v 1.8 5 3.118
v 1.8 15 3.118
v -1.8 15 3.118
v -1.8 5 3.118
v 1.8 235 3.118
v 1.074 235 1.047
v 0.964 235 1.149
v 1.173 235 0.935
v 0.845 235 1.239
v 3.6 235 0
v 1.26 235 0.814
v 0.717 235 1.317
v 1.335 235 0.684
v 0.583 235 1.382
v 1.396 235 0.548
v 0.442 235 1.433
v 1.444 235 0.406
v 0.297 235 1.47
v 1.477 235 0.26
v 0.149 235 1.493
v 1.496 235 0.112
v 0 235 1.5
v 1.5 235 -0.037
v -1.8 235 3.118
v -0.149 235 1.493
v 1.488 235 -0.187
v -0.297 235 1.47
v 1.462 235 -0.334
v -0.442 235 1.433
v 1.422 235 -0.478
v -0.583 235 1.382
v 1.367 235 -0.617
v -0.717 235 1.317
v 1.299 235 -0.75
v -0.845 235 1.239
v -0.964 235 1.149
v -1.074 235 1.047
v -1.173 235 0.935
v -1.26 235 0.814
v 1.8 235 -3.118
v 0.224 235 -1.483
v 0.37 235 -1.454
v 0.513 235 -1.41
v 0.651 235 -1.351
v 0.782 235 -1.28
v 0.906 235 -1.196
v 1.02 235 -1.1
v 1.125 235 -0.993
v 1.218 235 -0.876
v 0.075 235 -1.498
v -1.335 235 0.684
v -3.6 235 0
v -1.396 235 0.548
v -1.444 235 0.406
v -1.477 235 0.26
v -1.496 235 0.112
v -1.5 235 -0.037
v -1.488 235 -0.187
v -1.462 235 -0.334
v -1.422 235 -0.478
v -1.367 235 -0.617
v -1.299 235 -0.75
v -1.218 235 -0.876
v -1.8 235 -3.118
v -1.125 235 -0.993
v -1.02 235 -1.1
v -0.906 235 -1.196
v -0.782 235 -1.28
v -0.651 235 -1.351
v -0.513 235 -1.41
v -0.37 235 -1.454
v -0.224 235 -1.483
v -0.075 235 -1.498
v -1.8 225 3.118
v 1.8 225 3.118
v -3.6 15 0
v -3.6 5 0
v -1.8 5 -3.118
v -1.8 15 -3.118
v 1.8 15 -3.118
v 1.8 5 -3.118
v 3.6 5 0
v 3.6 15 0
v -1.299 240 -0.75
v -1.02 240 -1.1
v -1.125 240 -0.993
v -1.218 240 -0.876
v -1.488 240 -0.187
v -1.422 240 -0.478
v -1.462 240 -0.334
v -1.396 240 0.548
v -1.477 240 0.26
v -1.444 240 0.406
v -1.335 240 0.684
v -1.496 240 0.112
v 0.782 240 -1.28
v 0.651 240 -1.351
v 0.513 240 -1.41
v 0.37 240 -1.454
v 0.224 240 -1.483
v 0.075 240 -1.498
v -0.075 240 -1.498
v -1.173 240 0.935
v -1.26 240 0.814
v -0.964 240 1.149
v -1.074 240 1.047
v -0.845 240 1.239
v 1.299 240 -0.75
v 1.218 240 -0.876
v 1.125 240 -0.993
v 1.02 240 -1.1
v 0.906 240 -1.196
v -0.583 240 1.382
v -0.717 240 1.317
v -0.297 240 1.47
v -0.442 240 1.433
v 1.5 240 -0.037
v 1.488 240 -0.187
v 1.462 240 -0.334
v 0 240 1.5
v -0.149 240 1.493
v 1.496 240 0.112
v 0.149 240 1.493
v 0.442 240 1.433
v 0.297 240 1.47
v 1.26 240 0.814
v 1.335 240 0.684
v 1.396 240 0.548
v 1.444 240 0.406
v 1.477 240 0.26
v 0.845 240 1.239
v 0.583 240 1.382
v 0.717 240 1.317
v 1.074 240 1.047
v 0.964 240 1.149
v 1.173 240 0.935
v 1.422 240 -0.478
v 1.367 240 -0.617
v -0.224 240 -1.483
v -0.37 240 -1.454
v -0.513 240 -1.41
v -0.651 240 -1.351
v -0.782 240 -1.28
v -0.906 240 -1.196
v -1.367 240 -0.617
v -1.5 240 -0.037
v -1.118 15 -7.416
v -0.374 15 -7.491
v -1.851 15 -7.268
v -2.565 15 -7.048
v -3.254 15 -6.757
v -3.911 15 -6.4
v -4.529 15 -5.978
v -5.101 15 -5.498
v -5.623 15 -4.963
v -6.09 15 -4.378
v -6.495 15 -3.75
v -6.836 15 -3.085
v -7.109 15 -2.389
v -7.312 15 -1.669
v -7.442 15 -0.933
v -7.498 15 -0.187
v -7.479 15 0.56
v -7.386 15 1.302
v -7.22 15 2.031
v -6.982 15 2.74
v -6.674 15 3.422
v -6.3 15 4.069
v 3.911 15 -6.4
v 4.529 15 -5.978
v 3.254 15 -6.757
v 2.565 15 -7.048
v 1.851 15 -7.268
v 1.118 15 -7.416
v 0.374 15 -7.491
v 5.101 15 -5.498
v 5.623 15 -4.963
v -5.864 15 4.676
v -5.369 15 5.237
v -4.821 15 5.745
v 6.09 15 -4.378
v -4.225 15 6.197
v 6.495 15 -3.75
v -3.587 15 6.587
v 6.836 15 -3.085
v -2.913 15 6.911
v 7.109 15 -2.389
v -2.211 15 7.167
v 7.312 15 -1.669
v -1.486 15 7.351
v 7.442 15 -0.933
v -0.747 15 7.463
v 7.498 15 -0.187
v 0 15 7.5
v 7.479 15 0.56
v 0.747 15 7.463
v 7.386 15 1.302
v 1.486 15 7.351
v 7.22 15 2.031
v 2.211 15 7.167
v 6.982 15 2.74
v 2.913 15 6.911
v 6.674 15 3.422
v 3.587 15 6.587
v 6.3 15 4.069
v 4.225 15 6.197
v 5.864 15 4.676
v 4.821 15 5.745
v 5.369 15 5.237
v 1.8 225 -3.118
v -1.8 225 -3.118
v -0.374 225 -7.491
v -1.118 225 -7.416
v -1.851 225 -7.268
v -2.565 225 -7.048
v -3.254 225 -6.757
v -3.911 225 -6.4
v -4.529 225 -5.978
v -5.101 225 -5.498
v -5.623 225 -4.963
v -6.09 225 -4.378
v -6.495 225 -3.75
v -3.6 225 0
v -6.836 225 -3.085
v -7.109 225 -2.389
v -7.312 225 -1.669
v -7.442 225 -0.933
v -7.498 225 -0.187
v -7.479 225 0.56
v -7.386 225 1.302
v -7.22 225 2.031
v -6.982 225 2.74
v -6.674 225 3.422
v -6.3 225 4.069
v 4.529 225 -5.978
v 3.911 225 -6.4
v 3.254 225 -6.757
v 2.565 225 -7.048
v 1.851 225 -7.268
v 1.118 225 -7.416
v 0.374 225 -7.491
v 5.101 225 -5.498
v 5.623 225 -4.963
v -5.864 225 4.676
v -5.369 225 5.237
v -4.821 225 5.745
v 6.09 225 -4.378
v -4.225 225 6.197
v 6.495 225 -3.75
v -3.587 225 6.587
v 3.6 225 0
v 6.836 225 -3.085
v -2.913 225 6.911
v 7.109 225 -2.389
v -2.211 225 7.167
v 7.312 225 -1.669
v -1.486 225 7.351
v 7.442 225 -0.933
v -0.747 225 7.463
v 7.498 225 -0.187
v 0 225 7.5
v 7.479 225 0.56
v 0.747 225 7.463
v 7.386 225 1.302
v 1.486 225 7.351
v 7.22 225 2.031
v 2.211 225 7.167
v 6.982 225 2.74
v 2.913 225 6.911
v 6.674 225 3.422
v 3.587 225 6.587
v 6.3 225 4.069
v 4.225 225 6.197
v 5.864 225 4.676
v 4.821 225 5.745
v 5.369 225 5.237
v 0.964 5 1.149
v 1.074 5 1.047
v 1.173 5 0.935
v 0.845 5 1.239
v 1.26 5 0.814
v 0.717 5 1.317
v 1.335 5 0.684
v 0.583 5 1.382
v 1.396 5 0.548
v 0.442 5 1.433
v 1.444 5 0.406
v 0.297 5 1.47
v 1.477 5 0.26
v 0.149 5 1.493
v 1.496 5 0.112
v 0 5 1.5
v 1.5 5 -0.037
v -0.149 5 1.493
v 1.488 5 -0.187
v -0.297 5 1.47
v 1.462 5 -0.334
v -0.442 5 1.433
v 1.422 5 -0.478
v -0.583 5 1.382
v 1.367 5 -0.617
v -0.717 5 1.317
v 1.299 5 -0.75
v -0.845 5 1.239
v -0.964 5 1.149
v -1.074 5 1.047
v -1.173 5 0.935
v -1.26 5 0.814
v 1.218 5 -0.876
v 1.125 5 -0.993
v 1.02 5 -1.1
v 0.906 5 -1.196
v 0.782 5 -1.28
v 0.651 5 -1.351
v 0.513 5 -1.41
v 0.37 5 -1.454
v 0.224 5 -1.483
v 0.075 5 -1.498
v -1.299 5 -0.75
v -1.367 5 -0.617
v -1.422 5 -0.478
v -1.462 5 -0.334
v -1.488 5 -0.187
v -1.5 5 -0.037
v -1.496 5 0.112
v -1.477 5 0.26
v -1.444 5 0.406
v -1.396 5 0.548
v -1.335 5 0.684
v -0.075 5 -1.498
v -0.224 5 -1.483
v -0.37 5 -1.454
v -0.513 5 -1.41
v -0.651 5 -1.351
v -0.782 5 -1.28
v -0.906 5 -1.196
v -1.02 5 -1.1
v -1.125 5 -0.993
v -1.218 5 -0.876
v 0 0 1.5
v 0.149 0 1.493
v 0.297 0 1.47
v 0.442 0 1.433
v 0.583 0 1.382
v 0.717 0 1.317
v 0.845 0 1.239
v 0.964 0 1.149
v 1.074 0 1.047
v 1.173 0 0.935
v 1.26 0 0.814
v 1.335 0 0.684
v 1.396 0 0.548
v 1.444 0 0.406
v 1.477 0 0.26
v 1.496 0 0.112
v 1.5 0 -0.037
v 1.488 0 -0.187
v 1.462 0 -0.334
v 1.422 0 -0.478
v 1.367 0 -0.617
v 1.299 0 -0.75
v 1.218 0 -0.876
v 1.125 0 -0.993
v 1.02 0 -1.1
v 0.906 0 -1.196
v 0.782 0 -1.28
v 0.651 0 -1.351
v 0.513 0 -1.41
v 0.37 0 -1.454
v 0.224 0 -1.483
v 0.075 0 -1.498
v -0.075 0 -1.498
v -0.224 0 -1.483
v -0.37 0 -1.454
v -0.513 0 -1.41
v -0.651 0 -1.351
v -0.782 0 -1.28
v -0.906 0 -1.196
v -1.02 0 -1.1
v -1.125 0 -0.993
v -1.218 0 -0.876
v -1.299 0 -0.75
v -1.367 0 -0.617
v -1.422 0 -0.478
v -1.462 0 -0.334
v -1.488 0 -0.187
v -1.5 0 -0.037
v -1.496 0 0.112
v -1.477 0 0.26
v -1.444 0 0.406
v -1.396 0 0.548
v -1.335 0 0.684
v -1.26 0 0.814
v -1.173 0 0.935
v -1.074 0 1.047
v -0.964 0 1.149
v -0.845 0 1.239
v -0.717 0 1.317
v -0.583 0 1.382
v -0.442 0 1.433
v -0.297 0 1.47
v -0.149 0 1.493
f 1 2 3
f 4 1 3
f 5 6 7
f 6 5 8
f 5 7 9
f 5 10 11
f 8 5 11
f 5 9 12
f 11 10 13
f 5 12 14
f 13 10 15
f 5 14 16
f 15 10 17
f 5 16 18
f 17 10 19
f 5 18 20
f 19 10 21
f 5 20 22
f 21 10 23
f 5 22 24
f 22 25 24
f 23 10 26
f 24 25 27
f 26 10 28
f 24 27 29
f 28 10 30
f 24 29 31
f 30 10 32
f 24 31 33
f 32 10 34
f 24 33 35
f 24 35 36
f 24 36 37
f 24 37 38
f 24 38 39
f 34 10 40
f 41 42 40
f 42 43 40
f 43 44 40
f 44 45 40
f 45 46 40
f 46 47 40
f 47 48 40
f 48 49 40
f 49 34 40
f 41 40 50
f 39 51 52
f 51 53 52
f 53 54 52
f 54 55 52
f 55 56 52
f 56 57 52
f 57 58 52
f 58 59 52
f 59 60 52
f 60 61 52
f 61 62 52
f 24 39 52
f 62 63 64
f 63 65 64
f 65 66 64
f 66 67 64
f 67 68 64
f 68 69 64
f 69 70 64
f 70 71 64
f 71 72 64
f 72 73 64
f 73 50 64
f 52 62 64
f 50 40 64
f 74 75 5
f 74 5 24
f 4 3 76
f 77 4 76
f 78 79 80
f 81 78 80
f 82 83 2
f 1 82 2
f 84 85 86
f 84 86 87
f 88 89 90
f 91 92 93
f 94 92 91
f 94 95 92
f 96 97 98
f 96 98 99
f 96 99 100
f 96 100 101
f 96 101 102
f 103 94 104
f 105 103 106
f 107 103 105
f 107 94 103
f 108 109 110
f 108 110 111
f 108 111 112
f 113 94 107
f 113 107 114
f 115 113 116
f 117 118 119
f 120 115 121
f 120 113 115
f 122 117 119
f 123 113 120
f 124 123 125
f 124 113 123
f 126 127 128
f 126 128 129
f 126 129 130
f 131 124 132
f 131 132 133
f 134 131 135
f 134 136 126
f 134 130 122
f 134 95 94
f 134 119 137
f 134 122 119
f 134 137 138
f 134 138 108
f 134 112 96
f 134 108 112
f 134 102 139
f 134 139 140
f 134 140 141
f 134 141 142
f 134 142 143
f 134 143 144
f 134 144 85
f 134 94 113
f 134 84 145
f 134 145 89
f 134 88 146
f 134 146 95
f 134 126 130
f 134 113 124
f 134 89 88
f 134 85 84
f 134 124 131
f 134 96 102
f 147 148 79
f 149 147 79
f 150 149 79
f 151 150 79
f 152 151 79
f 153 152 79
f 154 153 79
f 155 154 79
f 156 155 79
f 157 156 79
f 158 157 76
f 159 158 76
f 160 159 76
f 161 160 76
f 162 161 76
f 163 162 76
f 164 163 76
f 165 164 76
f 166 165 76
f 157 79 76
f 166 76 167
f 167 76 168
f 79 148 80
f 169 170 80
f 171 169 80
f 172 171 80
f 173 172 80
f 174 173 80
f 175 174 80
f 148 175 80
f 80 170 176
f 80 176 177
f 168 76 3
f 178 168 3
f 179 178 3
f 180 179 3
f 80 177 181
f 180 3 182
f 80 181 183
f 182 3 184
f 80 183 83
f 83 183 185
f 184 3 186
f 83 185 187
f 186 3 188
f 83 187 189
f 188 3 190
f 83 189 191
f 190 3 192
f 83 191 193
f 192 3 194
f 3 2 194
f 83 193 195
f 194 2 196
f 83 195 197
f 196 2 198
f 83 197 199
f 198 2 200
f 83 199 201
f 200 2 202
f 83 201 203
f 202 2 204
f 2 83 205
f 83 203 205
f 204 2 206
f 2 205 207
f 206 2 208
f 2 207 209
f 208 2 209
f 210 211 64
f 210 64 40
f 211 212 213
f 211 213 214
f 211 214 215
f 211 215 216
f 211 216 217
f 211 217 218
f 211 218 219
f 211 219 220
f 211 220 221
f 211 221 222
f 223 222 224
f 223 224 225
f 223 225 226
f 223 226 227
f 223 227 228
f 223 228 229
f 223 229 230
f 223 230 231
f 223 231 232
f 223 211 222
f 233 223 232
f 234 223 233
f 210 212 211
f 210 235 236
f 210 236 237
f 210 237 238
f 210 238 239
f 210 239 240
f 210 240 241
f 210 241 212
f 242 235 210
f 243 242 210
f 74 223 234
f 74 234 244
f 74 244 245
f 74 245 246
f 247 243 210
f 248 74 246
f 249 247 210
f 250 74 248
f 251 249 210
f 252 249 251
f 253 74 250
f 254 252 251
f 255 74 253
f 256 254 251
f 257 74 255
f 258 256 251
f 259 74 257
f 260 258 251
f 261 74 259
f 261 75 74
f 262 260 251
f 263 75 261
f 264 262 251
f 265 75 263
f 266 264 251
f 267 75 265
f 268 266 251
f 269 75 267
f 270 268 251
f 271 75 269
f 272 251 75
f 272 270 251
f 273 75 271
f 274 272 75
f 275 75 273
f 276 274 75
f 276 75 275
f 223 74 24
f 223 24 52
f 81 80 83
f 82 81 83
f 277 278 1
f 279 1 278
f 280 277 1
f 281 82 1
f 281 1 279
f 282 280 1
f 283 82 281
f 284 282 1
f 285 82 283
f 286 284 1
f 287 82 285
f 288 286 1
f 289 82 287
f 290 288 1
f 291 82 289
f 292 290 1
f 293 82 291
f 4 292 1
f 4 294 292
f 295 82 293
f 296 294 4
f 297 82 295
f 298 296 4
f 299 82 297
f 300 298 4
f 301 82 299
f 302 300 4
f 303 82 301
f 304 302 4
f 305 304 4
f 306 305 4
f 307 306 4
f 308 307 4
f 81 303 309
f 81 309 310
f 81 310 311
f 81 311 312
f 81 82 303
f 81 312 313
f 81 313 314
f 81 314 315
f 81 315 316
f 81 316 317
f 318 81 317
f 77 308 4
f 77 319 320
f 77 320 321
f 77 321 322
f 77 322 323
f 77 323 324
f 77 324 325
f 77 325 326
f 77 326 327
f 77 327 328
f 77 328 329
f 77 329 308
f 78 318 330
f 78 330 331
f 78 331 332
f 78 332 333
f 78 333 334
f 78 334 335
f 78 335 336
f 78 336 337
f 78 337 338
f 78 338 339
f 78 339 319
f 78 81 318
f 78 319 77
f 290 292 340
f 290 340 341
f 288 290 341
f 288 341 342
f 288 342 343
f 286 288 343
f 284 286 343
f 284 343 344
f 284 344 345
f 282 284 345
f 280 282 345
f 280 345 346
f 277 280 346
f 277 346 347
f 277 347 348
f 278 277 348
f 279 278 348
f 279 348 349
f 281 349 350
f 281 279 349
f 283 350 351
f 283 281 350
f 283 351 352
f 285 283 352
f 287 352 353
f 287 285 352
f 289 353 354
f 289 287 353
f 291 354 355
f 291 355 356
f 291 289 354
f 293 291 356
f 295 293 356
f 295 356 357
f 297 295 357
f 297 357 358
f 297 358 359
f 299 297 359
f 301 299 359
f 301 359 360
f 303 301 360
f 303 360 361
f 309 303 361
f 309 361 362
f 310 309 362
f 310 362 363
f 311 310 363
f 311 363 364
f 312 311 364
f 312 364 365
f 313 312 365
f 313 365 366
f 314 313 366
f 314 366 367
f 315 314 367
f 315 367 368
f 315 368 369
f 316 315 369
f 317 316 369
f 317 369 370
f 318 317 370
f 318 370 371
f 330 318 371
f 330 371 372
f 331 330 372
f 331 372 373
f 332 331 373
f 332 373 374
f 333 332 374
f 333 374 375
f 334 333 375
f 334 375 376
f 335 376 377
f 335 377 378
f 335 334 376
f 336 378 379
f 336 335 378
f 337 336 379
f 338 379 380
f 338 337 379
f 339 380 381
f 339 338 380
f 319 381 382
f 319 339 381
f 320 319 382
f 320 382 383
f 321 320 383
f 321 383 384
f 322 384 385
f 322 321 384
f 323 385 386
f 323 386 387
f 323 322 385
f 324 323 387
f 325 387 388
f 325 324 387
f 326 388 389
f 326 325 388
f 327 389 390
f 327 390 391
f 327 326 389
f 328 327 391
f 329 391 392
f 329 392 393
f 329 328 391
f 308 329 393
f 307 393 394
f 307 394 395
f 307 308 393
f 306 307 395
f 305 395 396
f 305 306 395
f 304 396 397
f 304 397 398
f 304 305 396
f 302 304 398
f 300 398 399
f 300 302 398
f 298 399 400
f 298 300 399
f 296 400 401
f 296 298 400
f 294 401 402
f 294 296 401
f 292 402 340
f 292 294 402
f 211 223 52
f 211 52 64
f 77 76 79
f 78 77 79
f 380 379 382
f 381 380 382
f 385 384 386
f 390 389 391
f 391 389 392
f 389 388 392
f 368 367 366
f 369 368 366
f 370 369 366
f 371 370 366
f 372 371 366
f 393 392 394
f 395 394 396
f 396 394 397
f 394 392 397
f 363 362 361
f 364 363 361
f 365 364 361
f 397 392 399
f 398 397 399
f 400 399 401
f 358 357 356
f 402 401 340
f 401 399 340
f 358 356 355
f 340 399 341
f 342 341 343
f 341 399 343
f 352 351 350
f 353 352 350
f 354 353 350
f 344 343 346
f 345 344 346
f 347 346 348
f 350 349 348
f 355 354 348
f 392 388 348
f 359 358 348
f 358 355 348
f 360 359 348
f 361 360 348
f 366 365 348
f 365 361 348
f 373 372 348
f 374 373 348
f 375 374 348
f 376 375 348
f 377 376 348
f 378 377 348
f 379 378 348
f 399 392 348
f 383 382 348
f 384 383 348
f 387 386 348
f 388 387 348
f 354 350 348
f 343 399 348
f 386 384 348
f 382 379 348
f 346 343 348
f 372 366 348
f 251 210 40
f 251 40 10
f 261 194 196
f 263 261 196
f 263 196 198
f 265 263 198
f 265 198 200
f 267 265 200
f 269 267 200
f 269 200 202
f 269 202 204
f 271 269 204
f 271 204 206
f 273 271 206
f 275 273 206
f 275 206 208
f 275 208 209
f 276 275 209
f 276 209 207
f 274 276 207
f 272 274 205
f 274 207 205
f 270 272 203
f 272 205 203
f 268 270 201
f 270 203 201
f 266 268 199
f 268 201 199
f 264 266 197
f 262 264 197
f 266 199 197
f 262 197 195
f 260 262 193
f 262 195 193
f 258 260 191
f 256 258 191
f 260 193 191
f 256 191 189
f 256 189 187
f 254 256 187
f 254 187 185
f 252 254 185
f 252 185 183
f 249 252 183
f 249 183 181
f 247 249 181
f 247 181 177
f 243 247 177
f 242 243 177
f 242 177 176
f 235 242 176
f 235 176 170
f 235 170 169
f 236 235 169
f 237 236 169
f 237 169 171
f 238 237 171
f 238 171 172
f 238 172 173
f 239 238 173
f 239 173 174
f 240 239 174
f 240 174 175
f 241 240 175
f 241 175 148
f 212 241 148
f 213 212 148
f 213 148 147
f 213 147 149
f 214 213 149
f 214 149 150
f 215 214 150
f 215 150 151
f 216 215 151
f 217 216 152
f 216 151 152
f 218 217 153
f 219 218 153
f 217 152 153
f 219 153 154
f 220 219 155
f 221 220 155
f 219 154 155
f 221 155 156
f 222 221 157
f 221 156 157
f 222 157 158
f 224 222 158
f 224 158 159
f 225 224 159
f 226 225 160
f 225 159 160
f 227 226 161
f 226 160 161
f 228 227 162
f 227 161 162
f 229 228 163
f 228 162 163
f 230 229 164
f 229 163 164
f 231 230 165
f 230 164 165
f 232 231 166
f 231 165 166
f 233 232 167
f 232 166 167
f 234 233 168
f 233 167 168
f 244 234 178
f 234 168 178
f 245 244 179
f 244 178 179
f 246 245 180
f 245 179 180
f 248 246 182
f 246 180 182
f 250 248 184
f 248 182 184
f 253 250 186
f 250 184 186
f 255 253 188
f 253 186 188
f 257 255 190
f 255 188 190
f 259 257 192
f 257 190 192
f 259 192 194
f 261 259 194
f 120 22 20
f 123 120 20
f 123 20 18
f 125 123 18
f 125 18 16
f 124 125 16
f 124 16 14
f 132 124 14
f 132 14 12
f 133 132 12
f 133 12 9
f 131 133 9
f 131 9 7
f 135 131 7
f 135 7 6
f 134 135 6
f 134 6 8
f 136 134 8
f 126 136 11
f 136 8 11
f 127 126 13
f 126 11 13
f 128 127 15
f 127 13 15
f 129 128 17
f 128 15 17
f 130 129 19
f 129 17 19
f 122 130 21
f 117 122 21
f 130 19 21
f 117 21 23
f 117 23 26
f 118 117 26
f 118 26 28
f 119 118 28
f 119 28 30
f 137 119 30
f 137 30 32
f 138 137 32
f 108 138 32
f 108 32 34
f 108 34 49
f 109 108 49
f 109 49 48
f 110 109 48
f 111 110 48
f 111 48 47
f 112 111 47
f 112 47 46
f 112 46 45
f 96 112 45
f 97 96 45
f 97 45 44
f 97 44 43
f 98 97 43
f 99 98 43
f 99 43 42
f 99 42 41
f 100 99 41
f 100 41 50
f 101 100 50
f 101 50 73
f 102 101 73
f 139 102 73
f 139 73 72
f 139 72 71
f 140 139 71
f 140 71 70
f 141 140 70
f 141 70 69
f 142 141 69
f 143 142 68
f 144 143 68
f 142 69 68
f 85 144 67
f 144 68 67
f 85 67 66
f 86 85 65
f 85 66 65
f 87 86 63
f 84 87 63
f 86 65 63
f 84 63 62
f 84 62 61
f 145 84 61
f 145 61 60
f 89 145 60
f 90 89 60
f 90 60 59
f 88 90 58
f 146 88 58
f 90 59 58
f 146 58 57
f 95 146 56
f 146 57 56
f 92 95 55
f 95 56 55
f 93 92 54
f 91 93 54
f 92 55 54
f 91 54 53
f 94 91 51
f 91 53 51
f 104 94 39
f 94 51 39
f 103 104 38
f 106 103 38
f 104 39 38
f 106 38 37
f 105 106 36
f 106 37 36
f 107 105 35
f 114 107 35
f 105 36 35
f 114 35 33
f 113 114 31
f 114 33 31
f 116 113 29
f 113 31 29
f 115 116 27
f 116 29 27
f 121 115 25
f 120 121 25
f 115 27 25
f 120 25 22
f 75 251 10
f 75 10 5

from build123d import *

# Parameters (mm, degrees)
SKETCH2_R           = 7.5
BOSS_EXTRUDE1_DEPTH = 240
CUT_EXTRUDE1_START  = -15
SKETCH3_R           = 7.5
SKETCH3_R_2         = 1.5
CUT_EXTRUDE1_DEPTH  = 15
BOSS_EXTRUDE2_DEPTH = 10


with BuildPart() as part:
    # Sketch2 → Boss-Extrude1 (new body)
    with BuildSketch(Plane(origin=(0, 0, 0), x_dir=(1, 0, 0), z_dir=(0, 1, 0))):
        with Locations(Location((0, 0, 0), (0, 0, 270))):
            Circle(SKETCH2_R)
    extrude(amount=BOSS_EXTRUDE1_DEPTH)

    # Sketch3 → Cut-Extrude1 (cut)
    with BuildSketch(Plane(origin=(0, 240, 0), x_dir=(1, 0, 0), z_dir=(0, 1, 0)).offset(CUT_EXTRUDE1_START)):
        with Locations(Location((0, 0, 0), (0, 0, 270))):
            Circle(SKETCH3_R)
        with Locations(Location((0, 0, 0), (0, 0, 270))):
            Circle(SKETCH3_R_2, mode=Mode.SUBTRACT)
    cut_extrude1 = extrude(amount=CUT_EXTRUDE1_DEPTH, mode=Mode.SUBTRACT)

    # Sketch4 → Boss-Extrude2 (add)
    with BuildSketch(Plane(origin=(0, 225, 0), x_dir=(1, 0, 0), z_dir=(0, 1, 0))):
        Polygon((-1.8, 3.117691454), (1.8, 3.117691454), (3.6, 0), (1.8, -3.117691454), (-1.8, -3.117691454), (-3.6, 0), align=None)
    boss_extrude2 = extrude(amount=BOSS_EXTRUDE2_DEPTH)

    # Mirror1: Cut-Extrude1, Boss-Extrude2 across plane
    add(cut_extrude1.mirror(Plane.ZX.offset(120)), mode=Mode.SUBTRACT)
    add(boss_extrude2.mirror(Plane.ZX.offset(120)))


solid = part.part
